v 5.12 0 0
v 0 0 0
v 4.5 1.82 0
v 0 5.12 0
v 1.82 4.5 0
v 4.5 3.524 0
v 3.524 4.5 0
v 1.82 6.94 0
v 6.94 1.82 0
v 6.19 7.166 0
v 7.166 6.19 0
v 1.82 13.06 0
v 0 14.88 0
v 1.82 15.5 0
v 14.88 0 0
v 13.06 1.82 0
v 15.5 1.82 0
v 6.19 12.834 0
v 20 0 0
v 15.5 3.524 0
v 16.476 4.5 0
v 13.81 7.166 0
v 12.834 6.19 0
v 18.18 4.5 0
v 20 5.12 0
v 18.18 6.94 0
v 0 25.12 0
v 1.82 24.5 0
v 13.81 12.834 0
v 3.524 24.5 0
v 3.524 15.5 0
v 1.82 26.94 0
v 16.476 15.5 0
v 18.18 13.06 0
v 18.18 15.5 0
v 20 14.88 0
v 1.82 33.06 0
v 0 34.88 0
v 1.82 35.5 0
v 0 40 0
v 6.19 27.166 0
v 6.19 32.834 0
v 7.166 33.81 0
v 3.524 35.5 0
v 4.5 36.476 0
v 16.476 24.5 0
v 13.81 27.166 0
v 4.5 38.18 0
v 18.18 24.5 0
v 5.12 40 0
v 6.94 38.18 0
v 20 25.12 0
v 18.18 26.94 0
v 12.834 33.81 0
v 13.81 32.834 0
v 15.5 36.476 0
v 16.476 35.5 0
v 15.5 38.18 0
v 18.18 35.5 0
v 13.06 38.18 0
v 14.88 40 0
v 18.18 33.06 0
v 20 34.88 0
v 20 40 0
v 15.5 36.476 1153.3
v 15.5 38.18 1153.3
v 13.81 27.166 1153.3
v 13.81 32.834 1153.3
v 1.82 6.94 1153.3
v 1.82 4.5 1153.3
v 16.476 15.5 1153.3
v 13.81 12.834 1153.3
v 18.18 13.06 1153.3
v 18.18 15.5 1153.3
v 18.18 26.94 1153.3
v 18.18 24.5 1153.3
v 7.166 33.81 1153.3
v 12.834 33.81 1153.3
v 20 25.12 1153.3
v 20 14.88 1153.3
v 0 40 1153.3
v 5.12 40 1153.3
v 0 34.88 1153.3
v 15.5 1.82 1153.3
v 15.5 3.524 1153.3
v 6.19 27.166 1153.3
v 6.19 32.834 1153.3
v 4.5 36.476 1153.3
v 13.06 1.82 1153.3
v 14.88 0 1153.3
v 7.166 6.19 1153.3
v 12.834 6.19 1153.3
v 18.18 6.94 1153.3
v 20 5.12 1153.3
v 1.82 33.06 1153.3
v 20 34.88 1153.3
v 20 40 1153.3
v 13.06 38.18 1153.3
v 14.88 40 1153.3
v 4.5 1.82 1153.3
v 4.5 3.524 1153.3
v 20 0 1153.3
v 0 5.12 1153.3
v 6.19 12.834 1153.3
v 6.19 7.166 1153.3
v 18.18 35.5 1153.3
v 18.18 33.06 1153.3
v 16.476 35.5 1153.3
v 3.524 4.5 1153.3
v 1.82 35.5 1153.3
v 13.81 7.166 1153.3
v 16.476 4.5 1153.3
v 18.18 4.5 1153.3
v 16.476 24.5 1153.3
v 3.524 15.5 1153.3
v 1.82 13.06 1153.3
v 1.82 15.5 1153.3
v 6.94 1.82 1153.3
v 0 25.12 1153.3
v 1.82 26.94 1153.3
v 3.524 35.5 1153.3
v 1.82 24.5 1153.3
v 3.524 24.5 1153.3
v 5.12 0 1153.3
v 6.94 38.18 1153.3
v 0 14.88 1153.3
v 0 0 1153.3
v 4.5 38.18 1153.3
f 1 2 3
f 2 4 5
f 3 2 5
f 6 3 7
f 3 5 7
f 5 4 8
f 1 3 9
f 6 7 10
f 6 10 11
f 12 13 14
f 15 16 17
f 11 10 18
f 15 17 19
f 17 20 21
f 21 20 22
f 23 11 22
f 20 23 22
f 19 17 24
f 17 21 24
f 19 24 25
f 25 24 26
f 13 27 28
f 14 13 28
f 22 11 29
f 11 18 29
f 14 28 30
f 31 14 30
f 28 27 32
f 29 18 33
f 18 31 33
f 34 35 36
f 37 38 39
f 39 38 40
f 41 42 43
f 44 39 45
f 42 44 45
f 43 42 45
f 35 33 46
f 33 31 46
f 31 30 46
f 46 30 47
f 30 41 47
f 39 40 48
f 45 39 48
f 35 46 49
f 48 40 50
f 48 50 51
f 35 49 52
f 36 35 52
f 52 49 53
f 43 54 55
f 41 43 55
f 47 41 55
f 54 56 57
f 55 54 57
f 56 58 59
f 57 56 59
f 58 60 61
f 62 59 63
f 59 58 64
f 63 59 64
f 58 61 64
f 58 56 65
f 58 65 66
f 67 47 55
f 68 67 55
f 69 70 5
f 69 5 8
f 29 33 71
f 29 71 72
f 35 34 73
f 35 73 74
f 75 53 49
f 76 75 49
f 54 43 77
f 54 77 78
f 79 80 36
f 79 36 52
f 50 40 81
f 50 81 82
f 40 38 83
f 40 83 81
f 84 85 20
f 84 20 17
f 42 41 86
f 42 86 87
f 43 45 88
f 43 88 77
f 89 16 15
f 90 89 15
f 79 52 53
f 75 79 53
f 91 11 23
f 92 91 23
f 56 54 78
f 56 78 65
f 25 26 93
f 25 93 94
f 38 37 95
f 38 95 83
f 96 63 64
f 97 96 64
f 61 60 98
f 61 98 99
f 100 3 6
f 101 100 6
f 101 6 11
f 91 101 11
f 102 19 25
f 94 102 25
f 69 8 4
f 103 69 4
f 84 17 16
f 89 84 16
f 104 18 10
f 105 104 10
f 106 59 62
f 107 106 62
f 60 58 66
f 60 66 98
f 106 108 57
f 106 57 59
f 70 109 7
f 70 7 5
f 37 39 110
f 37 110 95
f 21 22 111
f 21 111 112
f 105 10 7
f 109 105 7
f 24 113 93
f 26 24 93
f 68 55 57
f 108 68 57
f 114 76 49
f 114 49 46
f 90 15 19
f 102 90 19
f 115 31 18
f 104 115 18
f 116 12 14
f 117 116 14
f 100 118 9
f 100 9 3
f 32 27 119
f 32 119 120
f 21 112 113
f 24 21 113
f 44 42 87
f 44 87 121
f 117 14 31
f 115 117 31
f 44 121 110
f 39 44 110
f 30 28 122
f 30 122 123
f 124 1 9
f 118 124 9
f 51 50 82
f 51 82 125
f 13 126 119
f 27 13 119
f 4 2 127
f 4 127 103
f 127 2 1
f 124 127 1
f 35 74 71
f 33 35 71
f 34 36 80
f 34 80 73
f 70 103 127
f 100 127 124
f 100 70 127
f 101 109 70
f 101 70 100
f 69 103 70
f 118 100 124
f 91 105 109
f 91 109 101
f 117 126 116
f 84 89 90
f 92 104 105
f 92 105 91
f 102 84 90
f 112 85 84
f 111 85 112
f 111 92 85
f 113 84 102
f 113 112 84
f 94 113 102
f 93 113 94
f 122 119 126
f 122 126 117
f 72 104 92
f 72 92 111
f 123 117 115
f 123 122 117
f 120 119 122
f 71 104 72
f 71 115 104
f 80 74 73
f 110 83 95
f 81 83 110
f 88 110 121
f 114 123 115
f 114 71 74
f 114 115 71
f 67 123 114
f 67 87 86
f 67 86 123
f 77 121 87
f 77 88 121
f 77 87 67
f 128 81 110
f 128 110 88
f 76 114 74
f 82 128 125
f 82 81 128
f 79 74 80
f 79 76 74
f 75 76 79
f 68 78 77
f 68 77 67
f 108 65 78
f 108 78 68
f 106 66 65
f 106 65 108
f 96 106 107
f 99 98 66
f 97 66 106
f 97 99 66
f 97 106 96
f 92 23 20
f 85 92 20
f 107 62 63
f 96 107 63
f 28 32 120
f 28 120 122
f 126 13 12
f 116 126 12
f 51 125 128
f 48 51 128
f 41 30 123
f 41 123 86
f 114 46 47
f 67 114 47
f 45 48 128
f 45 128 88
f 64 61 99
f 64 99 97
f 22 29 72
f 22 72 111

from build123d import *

# Parameters (mm, degrees)
SKETCH1_W           = 20
SKETCH1_H           = 40
BOSS_EXTRUDE1_DEPTH = 1153.3
CUT_EXTRUDE1_DEPTH  = 1154.3


with BuildPart() as part:
    # Sketch1 → Boss-Extrude1 (new body)
    with BuildSketch(Plane.XY):
        with Locations((10, 20)):
            Rectangle(SKETCH1_W, SKETCH1_H)
    extrude(amount=BOSS_EXTRUDE1_DEPTH)

    # Sketch2 → Cut-Extrude1 (cut, through all)
    with BuildSketch(Plane.XY.offset(1153.3)):
        Polygon((5.12, 40), (6.94, 38.18), (4.5, 38.18), (4.5, 36.475807358), (7.165807358, 33.81), (12.834192642, 33.81), (15.5, 36.475807358), (15.5, 38.18), (13.06, 38.18), (14.88, 40), align=None)
        Polygon((18.18, 35.5), (18.18, 33.06), (20, 34.88), (20, 25.12), (18.18, 26.94), (18.18, 24.5), (16.475807358, 24.5), (13.81, 27.165807358), (13.81, 32.834192642), (16.475807358, 35.5), align=None)
        Polygon((20, 14.88), (18.18, 13.06), (18.18, 15.5), (16.475807358, 15.5), (13.81, 12.834192642), (13.81, 7.165807358), (16.475807358, 4.5), (18.18, 4.5), (18.18, 6.94), (20, 5.12), align=None)
        Polygon((15.5, 1.82), (13.06, 1.82), (14.88, 0), (5.12, 0), (6.94, 1.82), (4.5, 1.82), (4.5, 3.524192642), (7.165807358, 6.19), (12.834192642, 6.19), (15.5, 3.524192642), align=None)
        Polygon((1.82, 4.5), (1.82, 6.94), (0, 5.12), (0, 14.88), (1.82, 13.06), (1.82, 15.5), (3.524192642, 15.5), (6.19, 12.834192642), (6.19, 7.165807358), (3.524192642, 4.5), align=None)
        Polygon((0, 25.12), (1.82, 26.94), (1.82, 24.5), (3.524192642, 24.5), (6.19, 27.165807358), (6.19, 32.834192642), (3.524192642, 35.5), (1.82, 35.5), (1.82, 33.06), (0, 34.88), align=None)
    extrude(amount=-CUT_EXTRUDE1_DEPTH, mode=Mode.SUBTRACT)


solid = part.part
